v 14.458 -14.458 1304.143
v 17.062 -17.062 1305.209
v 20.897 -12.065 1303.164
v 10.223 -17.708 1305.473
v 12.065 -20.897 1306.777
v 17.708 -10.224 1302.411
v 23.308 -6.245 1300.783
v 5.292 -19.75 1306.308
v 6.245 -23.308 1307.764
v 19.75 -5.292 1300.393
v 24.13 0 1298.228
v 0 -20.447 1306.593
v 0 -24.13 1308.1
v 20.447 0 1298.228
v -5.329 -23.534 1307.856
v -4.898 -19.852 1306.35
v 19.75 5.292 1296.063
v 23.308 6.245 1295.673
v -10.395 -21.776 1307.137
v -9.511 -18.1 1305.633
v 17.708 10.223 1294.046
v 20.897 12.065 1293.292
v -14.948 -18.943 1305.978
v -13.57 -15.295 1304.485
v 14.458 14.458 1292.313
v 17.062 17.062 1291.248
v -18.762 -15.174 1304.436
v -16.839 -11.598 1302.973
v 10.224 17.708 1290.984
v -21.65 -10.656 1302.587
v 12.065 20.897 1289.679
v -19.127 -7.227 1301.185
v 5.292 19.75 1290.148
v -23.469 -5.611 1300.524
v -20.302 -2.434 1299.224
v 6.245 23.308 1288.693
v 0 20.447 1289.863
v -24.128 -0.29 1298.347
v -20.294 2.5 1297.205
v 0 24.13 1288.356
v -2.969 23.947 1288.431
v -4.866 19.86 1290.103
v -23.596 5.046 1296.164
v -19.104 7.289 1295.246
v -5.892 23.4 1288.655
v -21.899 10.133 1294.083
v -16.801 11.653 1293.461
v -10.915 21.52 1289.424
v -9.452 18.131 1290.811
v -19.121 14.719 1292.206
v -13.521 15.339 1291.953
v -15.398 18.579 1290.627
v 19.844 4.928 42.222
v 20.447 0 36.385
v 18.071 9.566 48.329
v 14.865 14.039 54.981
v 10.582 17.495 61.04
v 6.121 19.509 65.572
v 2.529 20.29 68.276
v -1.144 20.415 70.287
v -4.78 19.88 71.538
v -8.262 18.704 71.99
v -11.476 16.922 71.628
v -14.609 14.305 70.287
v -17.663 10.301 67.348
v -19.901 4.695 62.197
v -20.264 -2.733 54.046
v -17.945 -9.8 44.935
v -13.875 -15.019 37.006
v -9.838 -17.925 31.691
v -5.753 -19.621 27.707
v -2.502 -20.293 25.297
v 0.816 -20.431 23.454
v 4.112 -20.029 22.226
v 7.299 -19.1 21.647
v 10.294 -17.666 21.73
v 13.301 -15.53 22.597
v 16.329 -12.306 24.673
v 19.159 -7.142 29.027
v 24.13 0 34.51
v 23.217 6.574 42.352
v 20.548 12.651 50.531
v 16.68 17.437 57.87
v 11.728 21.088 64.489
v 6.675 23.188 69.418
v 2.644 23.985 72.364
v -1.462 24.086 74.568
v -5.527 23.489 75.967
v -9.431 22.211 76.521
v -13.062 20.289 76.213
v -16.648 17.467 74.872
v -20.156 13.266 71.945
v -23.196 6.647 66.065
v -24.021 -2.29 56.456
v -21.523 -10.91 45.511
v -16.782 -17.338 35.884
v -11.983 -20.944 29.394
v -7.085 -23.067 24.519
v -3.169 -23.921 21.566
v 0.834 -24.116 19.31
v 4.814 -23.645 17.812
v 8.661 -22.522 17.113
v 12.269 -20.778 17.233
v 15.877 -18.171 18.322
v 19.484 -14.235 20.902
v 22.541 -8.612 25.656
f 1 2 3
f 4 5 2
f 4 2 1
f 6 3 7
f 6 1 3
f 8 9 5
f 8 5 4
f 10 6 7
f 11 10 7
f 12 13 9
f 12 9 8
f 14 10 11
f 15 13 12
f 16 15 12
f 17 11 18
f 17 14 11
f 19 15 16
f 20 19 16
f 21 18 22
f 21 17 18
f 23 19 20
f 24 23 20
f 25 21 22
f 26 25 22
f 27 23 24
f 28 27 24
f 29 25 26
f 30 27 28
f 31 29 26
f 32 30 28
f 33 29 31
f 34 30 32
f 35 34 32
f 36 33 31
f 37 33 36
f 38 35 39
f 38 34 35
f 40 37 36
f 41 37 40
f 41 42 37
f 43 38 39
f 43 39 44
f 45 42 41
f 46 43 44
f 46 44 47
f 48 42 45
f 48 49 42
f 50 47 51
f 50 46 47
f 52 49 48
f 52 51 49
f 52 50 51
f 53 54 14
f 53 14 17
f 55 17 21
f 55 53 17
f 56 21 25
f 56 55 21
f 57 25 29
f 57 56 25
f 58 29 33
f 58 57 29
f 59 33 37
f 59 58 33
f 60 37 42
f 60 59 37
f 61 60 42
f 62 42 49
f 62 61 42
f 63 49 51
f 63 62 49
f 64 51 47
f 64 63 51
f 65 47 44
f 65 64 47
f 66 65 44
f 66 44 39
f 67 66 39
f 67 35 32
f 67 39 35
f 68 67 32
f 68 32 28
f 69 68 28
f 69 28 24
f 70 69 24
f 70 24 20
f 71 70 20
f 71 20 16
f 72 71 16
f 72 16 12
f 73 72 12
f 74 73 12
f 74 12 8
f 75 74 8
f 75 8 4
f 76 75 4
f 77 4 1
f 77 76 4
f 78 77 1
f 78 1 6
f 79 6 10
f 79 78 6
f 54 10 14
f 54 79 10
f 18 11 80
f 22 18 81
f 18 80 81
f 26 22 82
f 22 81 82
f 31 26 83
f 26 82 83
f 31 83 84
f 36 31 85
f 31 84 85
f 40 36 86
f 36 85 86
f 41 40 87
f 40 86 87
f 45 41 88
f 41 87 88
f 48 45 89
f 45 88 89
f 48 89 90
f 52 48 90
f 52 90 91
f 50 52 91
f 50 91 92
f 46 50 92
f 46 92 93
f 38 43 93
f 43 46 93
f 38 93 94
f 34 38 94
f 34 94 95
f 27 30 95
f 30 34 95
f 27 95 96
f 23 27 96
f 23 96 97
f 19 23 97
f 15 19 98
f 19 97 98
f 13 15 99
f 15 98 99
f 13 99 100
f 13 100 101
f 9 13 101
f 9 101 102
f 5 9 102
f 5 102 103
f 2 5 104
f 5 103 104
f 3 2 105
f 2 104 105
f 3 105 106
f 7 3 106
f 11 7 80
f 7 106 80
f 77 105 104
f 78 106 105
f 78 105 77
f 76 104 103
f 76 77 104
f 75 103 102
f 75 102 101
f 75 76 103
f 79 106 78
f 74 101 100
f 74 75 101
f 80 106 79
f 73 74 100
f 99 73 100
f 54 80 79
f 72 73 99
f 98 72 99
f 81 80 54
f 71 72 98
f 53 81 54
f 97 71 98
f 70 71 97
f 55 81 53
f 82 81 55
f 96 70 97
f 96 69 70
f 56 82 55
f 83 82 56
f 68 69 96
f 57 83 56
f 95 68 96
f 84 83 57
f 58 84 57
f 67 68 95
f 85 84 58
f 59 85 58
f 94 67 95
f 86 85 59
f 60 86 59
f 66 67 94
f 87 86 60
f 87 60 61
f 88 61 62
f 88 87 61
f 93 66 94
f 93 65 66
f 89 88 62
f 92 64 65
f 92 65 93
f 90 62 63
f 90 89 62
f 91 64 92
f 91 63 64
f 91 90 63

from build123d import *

# Parameters (mm, degrees)
F0_R          = 24.13
F0_R_2        = 20.447
F1_DEPTH      = 1308.1
F3_DEPTH      = 24.131
F3_DEPTH_BACK = 24.131
F5_DEPTH      = 24.131
F5_DEPTH_BACK = 24.131
F8_W          = 178.4191885963
F8_H          = 167.3920117319
F9_DEPTH      = 50.8
F9_DEPTH_BACK = 20.32


with BuildPart() as f1:
    # F0 (on Top) → F1 (new body)
    with BuildSketch(Plane.XY):
        Circle(F0_R)
        Circle(F0_R_2, mode=Mode.SUBTRACT)
    extrude(amount=F1_DEPTH)

    # F2 (on Right) → F3 (cut, two sides)
    with BuildSketch(Plane.YZ) as f3_sk:
        Polygon((24.13, 1288.3563127231), (24.13, 1308.1), (-24.13, 1308.1), align=None)
    extrude(amount=-F3_DEPTH, mode=Mode.SUBTRACT)
    extrude(f3_sk.sketch, amount=F3_DEPTH_BACK, mode=Mode.SUBTRACT)

    # F4 (on Front) → F5 (cut, two sides)
    with BuildSketch(Plane.XZ) as f5_sk:
        Polygon((-28.575, 0), (28.575, 0), (-28.575, 29.0972948719), align=None)
    extrude(amount=F5_DEPTH, mode=Mode.SUBTRACT)
    extrude(f5_sk.sketch, amount=-F5_DEPTH_BACK, mode=Mode.SUBTRACT)

    # F8 (on line) → F9 (cut, two sides)
    with BuildSketch(Plane(origin=(2.9412132624, -6.4824828952, 5.7768372862), x_dir=(-0.9471380058, -0.2395200516, 0.2134472836), z_dir=(-0.3208264297, 0.7071067812, -0.6301352252))) as f9_sk:
        with Locations((5.3417463787, 7.3568988591)):
            Rectangle(F8_W, F8_H)
    extrude(amount=F9_DEPTH, mode=Mode.SUBTRACT)
    extrude(f9_sk.sketch, amount=-F9_DEPTH_BACK, mode=Mode.SUBTRACT)


solid = f1.part
